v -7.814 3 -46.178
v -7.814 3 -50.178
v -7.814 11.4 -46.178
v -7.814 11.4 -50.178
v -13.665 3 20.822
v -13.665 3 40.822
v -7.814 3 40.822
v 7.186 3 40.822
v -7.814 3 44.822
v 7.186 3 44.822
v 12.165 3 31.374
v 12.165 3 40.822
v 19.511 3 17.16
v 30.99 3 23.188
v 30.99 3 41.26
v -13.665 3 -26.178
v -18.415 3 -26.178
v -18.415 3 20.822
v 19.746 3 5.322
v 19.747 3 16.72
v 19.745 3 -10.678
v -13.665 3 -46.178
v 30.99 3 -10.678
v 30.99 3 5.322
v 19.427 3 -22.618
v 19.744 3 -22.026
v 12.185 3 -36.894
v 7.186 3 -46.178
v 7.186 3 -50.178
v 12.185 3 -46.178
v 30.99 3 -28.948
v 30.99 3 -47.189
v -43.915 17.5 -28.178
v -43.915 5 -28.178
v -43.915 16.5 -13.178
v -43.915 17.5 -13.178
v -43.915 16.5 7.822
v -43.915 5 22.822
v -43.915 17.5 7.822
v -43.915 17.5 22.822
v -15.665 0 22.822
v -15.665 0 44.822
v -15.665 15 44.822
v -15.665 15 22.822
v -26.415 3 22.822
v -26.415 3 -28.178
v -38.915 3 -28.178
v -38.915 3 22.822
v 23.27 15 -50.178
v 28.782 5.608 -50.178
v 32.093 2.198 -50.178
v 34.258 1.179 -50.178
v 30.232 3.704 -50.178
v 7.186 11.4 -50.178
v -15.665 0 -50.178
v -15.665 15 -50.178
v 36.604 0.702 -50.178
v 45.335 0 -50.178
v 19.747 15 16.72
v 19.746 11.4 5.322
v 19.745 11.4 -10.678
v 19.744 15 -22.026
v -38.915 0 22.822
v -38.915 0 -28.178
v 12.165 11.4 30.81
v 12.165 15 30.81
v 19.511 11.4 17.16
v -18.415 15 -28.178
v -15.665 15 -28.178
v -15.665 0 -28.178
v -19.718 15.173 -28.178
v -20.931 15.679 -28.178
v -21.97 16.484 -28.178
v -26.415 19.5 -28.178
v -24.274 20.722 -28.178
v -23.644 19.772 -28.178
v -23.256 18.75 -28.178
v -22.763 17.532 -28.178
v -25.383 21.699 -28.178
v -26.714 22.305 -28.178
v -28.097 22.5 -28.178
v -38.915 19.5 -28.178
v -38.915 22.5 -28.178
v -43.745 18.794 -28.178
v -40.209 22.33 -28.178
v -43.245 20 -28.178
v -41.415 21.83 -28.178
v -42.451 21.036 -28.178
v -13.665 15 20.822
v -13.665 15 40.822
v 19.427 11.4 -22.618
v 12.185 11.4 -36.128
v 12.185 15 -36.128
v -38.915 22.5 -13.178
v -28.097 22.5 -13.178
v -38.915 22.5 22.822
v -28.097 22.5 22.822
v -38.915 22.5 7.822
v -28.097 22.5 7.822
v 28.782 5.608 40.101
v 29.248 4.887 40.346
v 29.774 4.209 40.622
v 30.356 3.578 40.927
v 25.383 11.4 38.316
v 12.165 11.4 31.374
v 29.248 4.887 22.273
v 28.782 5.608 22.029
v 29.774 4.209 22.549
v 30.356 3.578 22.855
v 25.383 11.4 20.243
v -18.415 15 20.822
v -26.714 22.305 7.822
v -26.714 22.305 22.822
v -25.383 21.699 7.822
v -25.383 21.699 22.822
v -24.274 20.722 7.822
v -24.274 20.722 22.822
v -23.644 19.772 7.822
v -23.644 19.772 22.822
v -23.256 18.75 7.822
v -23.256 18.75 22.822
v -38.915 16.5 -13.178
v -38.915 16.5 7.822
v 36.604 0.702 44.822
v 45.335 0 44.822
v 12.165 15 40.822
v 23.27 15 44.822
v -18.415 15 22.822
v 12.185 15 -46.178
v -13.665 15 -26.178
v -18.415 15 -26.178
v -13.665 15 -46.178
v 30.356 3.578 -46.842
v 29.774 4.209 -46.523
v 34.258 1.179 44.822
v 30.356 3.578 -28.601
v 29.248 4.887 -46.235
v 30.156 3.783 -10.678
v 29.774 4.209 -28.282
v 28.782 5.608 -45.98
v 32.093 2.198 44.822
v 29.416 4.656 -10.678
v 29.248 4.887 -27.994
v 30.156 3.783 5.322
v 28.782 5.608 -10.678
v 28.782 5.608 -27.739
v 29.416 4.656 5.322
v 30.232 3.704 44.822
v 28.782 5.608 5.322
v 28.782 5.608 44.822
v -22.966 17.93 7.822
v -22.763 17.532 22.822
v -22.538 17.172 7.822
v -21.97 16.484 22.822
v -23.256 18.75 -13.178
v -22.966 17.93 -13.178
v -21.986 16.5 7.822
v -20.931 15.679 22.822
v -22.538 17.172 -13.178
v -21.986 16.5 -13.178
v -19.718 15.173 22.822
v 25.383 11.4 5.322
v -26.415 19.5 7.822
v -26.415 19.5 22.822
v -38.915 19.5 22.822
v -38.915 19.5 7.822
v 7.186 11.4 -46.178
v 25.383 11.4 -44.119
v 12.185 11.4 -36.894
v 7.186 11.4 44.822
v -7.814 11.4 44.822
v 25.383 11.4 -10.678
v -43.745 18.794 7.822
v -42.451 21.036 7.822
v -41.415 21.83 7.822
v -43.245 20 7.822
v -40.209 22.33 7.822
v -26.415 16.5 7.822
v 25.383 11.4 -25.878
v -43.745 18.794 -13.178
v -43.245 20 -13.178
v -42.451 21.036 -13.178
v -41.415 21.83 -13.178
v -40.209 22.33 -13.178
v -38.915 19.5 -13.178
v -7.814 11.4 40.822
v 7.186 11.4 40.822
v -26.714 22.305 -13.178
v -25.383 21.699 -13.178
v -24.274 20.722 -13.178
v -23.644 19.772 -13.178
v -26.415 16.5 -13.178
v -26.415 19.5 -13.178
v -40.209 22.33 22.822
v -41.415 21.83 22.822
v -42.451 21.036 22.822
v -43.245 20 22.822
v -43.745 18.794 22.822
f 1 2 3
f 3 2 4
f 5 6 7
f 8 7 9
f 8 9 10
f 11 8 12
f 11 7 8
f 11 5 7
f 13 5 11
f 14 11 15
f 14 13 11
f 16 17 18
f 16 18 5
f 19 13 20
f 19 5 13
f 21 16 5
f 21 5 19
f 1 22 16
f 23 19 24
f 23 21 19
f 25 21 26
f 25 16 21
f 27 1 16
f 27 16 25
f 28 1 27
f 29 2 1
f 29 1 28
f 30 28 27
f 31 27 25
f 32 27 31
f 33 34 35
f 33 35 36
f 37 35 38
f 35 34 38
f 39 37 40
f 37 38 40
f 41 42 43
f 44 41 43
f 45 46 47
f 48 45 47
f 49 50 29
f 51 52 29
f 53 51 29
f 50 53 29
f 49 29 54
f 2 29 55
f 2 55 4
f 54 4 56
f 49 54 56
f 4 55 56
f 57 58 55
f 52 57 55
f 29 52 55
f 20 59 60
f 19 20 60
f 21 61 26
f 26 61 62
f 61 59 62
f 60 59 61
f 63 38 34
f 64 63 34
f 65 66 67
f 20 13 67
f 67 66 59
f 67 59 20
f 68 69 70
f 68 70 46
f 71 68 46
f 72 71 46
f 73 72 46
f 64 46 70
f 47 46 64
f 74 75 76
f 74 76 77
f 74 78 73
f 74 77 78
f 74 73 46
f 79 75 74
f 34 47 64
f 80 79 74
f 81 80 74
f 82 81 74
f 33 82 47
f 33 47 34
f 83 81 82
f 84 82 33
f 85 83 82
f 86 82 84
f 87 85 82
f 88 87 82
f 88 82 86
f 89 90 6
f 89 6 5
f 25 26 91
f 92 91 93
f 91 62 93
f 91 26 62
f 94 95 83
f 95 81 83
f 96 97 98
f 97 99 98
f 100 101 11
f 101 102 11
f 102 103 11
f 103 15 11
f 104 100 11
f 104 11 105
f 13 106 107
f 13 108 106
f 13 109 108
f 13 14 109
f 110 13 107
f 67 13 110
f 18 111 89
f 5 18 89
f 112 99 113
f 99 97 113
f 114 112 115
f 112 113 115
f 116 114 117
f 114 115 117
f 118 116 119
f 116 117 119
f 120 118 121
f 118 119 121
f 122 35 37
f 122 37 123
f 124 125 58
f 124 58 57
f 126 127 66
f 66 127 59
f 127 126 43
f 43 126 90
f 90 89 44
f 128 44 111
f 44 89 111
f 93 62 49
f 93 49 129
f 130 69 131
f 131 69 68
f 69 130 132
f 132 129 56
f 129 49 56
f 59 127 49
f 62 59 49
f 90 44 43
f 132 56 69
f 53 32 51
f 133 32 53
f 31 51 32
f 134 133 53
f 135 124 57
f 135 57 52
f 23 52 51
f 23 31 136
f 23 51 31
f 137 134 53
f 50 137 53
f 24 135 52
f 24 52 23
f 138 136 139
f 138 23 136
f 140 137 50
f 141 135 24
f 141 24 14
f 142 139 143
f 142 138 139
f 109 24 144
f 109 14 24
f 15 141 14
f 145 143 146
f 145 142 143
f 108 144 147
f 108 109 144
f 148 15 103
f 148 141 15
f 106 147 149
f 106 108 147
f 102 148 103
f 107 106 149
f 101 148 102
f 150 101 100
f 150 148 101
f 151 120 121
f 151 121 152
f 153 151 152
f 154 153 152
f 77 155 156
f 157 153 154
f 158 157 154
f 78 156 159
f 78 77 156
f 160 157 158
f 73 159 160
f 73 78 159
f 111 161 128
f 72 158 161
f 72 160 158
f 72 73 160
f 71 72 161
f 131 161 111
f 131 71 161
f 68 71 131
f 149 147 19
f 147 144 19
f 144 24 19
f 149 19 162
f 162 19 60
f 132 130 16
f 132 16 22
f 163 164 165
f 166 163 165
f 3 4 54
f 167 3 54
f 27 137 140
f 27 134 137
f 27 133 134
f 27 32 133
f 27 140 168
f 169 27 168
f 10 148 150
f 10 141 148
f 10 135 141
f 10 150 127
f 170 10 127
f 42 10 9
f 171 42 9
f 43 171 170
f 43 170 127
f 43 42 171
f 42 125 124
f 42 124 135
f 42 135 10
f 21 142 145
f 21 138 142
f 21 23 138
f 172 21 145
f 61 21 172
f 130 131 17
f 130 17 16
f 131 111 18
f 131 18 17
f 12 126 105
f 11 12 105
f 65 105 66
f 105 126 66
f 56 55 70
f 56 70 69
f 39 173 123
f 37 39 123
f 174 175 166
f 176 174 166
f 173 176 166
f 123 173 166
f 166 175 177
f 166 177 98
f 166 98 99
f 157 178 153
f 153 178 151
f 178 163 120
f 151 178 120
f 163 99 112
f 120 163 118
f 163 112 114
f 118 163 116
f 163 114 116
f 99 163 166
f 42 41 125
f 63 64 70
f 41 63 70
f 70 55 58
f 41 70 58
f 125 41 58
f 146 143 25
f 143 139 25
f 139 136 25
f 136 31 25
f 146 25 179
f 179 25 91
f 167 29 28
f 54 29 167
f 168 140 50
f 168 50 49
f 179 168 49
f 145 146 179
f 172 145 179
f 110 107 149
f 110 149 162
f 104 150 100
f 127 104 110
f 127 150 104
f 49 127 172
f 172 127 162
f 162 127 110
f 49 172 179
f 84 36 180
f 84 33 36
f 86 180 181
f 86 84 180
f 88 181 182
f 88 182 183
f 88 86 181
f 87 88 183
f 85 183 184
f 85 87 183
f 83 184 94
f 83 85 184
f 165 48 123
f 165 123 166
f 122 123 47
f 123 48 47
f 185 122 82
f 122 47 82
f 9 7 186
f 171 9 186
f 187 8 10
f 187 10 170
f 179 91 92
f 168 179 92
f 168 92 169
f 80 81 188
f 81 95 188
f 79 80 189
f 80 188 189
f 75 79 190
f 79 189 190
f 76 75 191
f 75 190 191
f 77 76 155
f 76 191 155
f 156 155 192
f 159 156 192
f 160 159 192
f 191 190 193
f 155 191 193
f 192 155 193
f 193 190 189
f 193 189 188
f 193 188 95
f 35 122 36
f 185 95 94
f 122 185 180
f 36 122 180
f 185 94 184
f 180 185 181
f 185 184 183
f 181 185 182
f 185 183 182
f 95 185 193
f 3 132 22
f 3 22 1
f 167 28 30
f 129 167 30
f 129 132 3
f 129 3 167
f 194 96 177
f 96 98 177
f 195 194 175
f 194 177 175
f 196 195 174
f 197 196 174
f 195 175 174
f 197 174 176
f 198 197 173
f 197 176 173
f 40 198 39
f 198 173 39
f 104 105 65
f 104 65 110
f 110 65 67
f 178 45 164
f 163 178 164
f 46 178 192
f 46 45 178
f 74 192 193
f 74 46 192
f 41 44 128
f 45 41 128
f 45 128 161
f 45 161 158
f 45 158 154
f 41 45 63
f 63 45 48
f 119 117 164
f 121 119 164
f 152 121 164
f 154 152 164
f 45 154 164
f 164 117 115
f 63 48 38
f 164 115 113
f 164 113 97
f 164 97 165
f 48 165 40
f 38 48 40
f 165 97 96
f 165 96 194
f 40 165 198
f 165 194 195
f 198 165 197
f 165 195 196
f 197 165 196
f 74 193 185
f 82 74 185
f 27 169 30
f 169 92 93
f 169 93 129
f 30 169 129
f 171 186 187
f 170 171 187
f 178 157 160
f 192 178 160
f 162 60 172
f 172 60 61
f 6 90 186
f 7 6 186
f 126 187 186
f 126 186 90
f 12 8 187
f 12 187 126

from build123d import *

# Parameters (mm, degrees)
SKETCH1_W                = 95
SKETCH1_H                = 95
BOSS_EXTRUDE1_DEPTH      = 20
SKETCH2_W                = 15
SKETCH2_H                = 8.4
CUT_EXTRUDE1_DEPTH       = 50
CUT_EXTRUDE3_DEPTH       = 100
FILLET1_R                = 10
CUT_EXTRUDE4_DEPTH       = 17
SKETCH8_W                = 15
SKETCH8_H                = 8.4
CUT_EXTRUDE5_DEPTH       = 4
SKETCH9_W                = 15
SKETCH9_H                = 8.4
CUT_EXTRUDE6_DEPTH       = 4
SKETCH10_W               = 15
SKETCH10_H               = 8.4
CUT_EXTRUDE7_DEPTH       = 100
SKETCH11_W               = 15
SKETCH11_H               = 8.4
CUT_EXTRUDE8_DEPTH       = 100
SKETCH12_W               = 96.22761595
SKETCH12_H               = 5
CUT_EXTRUDE9_DEPTH       = 100
SKETCH14_W               = 16
SKETCH14_H               = 8.4
CUT_EXTRUDE10_DEPTH      = 100
SKETCH15_W               = 16
SKETCH15_H               = 8.4
CUT_EXTRUDE11_DEPTH      = 100
SKETCH16_W               = 16
SKETCH16_H               = 8.4
CUT_EXTRUDE13_DEPTH      = 100
CUT_EXTRUDE16_DEPTH      = 12
SKETCH21_W               = 23.779532914
SKETCH21_H               = 2
BOSS_EXTRUDE2_DEPTH      = 12
SKETCH23_W               = 23.759878039
SKETCH23_H               = 2
BOSS_EXTRUDE3_DEPTH      = 12
CUT_EXTRUDE19_DEPTH      = 100
CUT_EXTRUDE19_DEPTH_BACK = 100
SKETCH24_W               = 15
SKETCH24_H               = 8.4
SKETCH26_W               = 20
SKETCH26_H               = 95
BOSS_EXTRUDE4_DEPTH      = 20
SKETCH31_W               = 95
SKETCH31_H               = 20
BOSS_EXTRUDE6_DEPTH      = 10
SKETCH32_W               = 12.5
SKETCH32_H               = 16.5
CUT_EXTRUDE22_DEPTH      = 100
SKETCH33_W               = 3.75
SKETCH33_H               = 20
CUT_EXTRUDE23_DEPTH      = 100
SKETCH34_W               = 26.25
SKETCH34_H               = 12.5
CUT_EXTRUDE24_DEPTH      = 100
SKETCH35_W               = 34
SKETCH35_H               = 47.07285681
CUT_EXTRUDE25_DEPTH      = 22
SKETCH36_W               = 34
SKETCH36_H               = 30.604426896
CUT_EXTRUDE26_DEPTH      = 22
SKETCH37_W               = 26.25
SKETCH37_H               = 21
CUT_EXTRUDE28_DEPTH      = 6
SKETCH38_W               = 5.75
SKETCH38_H               = 22.5
CUT_EXTRUDE29_DEPTH      = 100
CHAMFER1_SIZE            = 5
SKETCH39_W               = 2.070576792
SKETCH39_H               = 87
CUT_EXTRUDE30_DEPTH      = 12
FILLET4_R                = 5
FILLET5_R                = 5
SKETCH40_W               = 4.75
SKETCH40_H               = 47
CUT_EXTRUDE31_DEPTH      = 12
FILLET6_R                = 5


with BuildPart() as part:
    # Sketch1 → Boss-Extrude1 (new body)
    with BuildSketch(Plane(origin=(0, 0, 0), x_dir=(1, 0, 0), z_dir=(0, 1, 0))):
        with Locations((-2.165031067, 2.677660124)):
            Rectangle(SKETCH1_W, SKETCH1_H)
    extrude(amount=BOSS_EXTRUDE1_DEPTH)

    # Sketch2 → Cut-Extrude1 (cut)
    with BuildSketch(Plane(origin=(45.334968933, 0, 0), x_dir=(0, 0, -1), z_dir=(1, 0, 0))):
        with Locations((2.677660124, 7.2)):
            Rectangle(SKETCH2_W, SKETCH2_H)
    extrude(amount=-CUT_EXTRUDE1_DEPTH, mode=Mode.SUBTRACT)

    # Sketch6 → Cut-Extrude3 (cut)
    with BuildSketch(Plane.XY.offset(44.822339876)):
        Polygon((45.334968933, 0), (31.416327077, 1.119733542), (20.334968933, 20), (45.334968933, 20), align=None)
    extrude(amount=-CUT_EXTRUDE3_DEPTH, mode=Mode.SUBTRACT)

    # Fillet1
    # the kernel refuses this fillet: 10 mm, written as the material it adds along each edge
    with BuildSketch(Plane(origin=(31.416327077, 1.119733542, 44.822339876), x_dir=(0.9967796443594351, -0.08018940447888392, 0), z_dir=(0, 0, -1))) as fillet1_piece_1_section:
        with BuildLine():
            CenterArc((FILLET1_R * 0.52046366993, -FILLET1_R), FILLET1_R, 90, 54.990678882)
            Line((-FILLET1_R * 0.298595051697, -FILLET1_R * 0.426290308146), (0, 0))
            Line((0, 0), (FILLET1_R * 0.52046366993, 0))
        make_face()
    fillet1_piece_1 = extrude(amount=95, mode=Mode.PRIVATE)
    fillet1_piece_1 = split(fillet1_piece_1, bisect_by=Plane(origin=(32.462514907, 1.548685907, 4.822339876), z_dir=(0, 0, 1)), keep=Keep.TOP, mode=Mode.PRIVATE)
    fillet1_piece_1 = split(fillet1_piece_1, bisect_by=Plane(origin=(32.462514907, 3, 24.822339876), z_dir=(0, -1, 0)), keep=Keep.TOP, mode=Mode.PRIVATE)
    add(fillet1_piece_1)
    with BuildSketch(Plane(origin=(31.416327077, 1.119733542, 44.822339876), x_dir=(0.9967796443594351, -0.08018940447888392, 0), z_dir=(0, 0, -1))) as fillet1_piece_2_section:
        with BuildLine():
            CenterArc((FILLET1_R * 0.52046366993, -FILLET1_R), FILLET1_R, 90, 54.990678882)
            Line((-FILLET1_R * 0.298595051697, -FILLET1_R * 0.426290308146), (0, 0))
            Line((0, 0), (FILLET1_R * 0.52046366993, 0))
        make_face()
    fillet1_piece_2 = extrude(amount=95, mode=Mode.PRIVATE)
    fillet1_piece_2 = split(fillet1_piece_2, bisect_by=Plane(origin=(29.780943428, 3.965739863, 4.822339876), z_dir=(0, 0, 1)), keep=Keep.TOP, mode=Mode.PRIVATE)
    fillet1_piece_2 = split(fillet1_piece_2, bisect_by=Plane(origin=(29.780943428, 3, 24.822339876), z_dir=(0, 1, 0)), keep=Keep.TOP, mode=Mode.PRIVATE)
    add(fillet1_piece_2)
    with BuildSketch(Plane(origin=(31.416327077, 1.119733542, 44.822339876), x_dir=(0.9967796443594351, -0.08018940447888392, 0), z_dir=(0, 0, -1))) as fillet1_piece_3_section:
        with BuildLine():
            CenterArc((FILLET1_R * 0.52046366993, -FILLET1_R), FILLET1_R, 90, 54.990678882)
            Line((-FILLET1_R * 0.298595051697, -FILLET1_R * 0.426290308146), (0, 0))
            Line((0, 0), (FILLET1_R * 0.52046366993, 0))
        make_face()
    fillet1_piece_3 = extrude(amount=95, mode=Mode.PRIVATE)
    fillet1_piece_3 = split(fillet1_piece_3, bisect_by=Plane(origin=(32.462514907, 1.548685907, -10.177660124), z_dir=(0, 0, 1)), keep=Keep.TOP, mode=Mode.PRIVATE)
    fillet1_piece_3 = split(fillet1_piece_3, bisect_by=Plane(origin=(32.462514907, 1.548685907, 4.822339876), z_dir=(0, 0, -1)), keep=Keep.TOP, mode=Mode.PRIVATE)
    fillet1_piece_3 = split(fillet1_piece_3, bisect_by=Plane(origin=(32.462514907, 3, -2.677660124), z_dir=(0, -1, 0)), keep=Keep.TOP, mode=Mode.PRIVATE)
    add(fillet1_piece_3)
    with BuildSketch(Plane(origin=(31.416327077, 1.119733542, 44.822339876), x_dir=(0.9967796443594351, -0.08018940447888392, 0), z_dir=(0, 0, -1))) as fillet1_piece_4_section:
        with BuildLine():
            CenterArc((FILLET1_R * 0.52046366993, -FILLET1_R), FILLET1_R, 90, 54.990678882)
            Line((-FILLET1_R * 0.298595051697, -FILLET1_R * 0.426290308146), (0, 0))
            Line((0, 0), (FILLET1_R * 0.52046366993, 0))
        make_face()
    fillet1_piece_4 = extrude(amount=95, mode=Mode.PRIVATE)
    fillet1_piece_4 = split(fillet1_piece_4, bisect_by=Plane(origin=(32.462514907, 1.548685907, -10.177660124), z_dir=(0, 0, -1)), keep=Keep.TOP, mode=Mode.PRIVATE)
    fillet1_piece_4 = split(fillet1_piece_4, bisect_by=Plane(origin=(32.462514907, 3, -30.177660124), z_dir=(0, -1, 0)), keep=Keep.TOP, mode=Mode.PRIVATE)
    add(fillet1_piece_4)
    with BuildSketch(Plane(origin=(31.416327077, 1.119733542, 44.822339876), x_dir=(0.9967796443594351, -0.08018940447888392, 0), z_dir=(0, 0, -1))) as fillet1_piece_5_section:
        with BuildLine():
            CenterArc((FILLET1_R * 0.52046366993, -FILLET1_R), FILLET1_R, 90, 54.990678882)
            Line((-FILLET1_R * 0.298595051697, -FILLET1_R * 0.426290308146), (0, 0))
            Line((0, 0), (FILLET1_R * 0.52046366993, 0))
        make_face()
    fillet1_piece_5 = extrude(amount=95, mode=Mode.PRIVATE)
    fillet1_piece_5 = split(fillet1_piece_5, bisect_by=Plane(origin=(29.780943428, 3.965739863, -10.177660124), z_dir=(0, 0, -1)), keep=Keep.TOP, mode=Mode.PRIVATE)
    fillet1_piece_5 = split(fillet1_piece_5, bisect_by=Plane(origin=(29.780943428, 3, -30.177660124), z_dir=(0, 1, 0)), keep=Keep.TOP, mode=Mode.PRIVATE)
    add(fillet1_piece_5)

    # Sketch7 → Cut-Extrude4 (cut)
    with BuildSketch(Plane(origin=(0, 20, 0), x_dir=(1, 0, 0), z_dir=(0, 1, 0))):
        Polygon((11.360713437, -29.822339876), (18.334968933, -16.542288661), (9.481601456, -11.892784997), (2.50734596, -25.172836212), align=None)
        Polygon((18.334968933, 22.020257336), (11.132000664, 35.177660124), (2.360398805, 30.375681278), (9.563367074, 17.21827849), align=None)
    extrude(amount=-CUT_EXTRUDE4_DEPTH, mode=Mode.SUBTRACT)

    # Sketch8 → Cut-Extrude5 (cut)
    with BuildSketch(Plane(origin=(12.327397833, 0, 6.473952599), x_dir=(0.4649503663833249, 0, -0.885336747684186), z_dir=(0.8853367476841859, 0, 0.4649503663833248))):
        with Locations((-13.620645519, 7.2)):
            Rectangle(SKETCH8_W, SKETCH8_H)
    extrude(amount=-CUT_EXTRUDE5_DEPTH, mode=Mode.SUBTRACT)

    # Sketch9 → Cut-Extrude6 (cut)
    with BuildSketch(Plane(origin=(14.610669282, 0, -7.99855328), x_dir=(-0.48019788460400603, 0, -0.8771601858394155), z_dir=(0.8771601858394155, 0, -0.48019788460400603))):
        with Locations((18.010879722, 7.2)):
            Rectangle(SKETCH9_W, SKETCH9_H)
    extrude(amount=-CUT_EXTRUDE6_DEPTH, mode=Mode.SUBTRACT)

    # Sketch10 → Cut-Extrude7 (cut)
    with BuildSketch(Plane(origin=(8.786050842, 0, 4.614151134), x_dir=(0.464950366383325, 0, -0.8853367476841859), z_dir=(0.8853367476841859, 0, 0.464950366383325))):
        with Locations((-13.620645519, 7.2)):
            Rectangle(SKETCH10_W, SKETCH10_H)
    extrude(amount=CUT_EXTRUDE7_DEPTH, mode=Mode.SUBTRACT)

    # Sketch11 → Cut-Extrude8 (cut)
    with BuildSketch(Plane(origin=(11.102028539, 0, -6.077761742), x_dir=(-0.48019788460400603, 0, -0.8771601858394155), z_dir=(0.8771601858394155, 0, -0.48019788460400603))):
        with Locations((18.010879722, 7.2)):
            Rectangle(SKETCH11_W, SKETCH11_H)
    extrude(amount=CUT_EXTRUDE8_DEPTH, mode=Mode.SUBTRACT)

    # Sketch12 → Cut-Extrude9 (cut)
    with BuildSketch(Plane.XY.offset(44.822339876)):
        with Locations((-1.551223092, 17.5)):
            Rectangle(SKETCH12_W, SKETCH12_H)
    extrude(amount=-CUT_EXTRUDE9_DEPTH, mode=Mode.SUBTRACT)

    # Sketch14 → Cut-Extrude10 (cut)
    with BuildSketch(Plane(origin=(11.102028539, 0, -6.077761742), x_dir=(-0.48019788460400603, 0, -0.8771601858394155), z_dir=(0.8771601858394155, 0, -0.48019788460400603))):
        with Locations((18.510879722, 7.2)):
            Rectangle(SKETCH14_W, SKETCH14_H)
    extrude(amount=CUT_EXTRUDE10_DEPTH, mode=Mode.SUBTRACT)

    # Sketch15 → Cut-Extrude11 (cut)
    with BuildSketch(Plane(origin=(8.786050842, 0, 4.614151134), x_dir=(0.464950366383325, 0, -0.8853367476841859), z_dir=(0.8853367476841859, 0, 0.464950366383325))):
        with Locations((-14.120645519, 7.2)):
            Rectangle(SKETCH15_W, SKETCH15_H)
    extrude(amount=CUT_EXTRUDE11_DEPTH, mode=Mode.SUBTRACT)

    # Sketch16 → Cut-Extrude13 (cut)
    with BuildSketch(Plane(origin=(-4.665031067, 0, 0), x_dir=(0, 0, -1), z_dir=(1, 0, 0))):
        with Locations((2.677660124, 7.2)):
            Rectangle(SKETCH16_W, SKETCH16_H)
    extrude(amount=CUT_EXTRUDE13_DEPTH, mode=Mode.SUBTRACT)

    # Sketch19 → Cut-Extrude16 (cut)
    with BuildSketch(Plane(origin=(0, 15, 0), x_dir=(1, 0, 0), z_dir=(0, 1, 0))):
        Polygon((12.165423764, -30.809704699), (19.747212292, -16.720116958), (19.744163962, 22.025988312), (12.185078639, 36.127769372), (12.185078639, 48.177660124), (-11.594454275, 48.177660124), (-11.594454275, -42.822339876), (12.165423764, -42.822339876), align=None)
    extrude(amount=-CUT_EXTRUDE16_DEPTH, mode=Mode.SUBTRACT)

    # Sketch21 → Boss-Extrude2 (add)
    with BuildSketch(Plane(origin=(0, 3, 0), x_dir=(1, 0, 0), z_dir=(0, 1, 0))):
        with Locations((0.295312182, 47.177660124)):
            Rectangle(SKETCH21_W, SKETCH21_H)
    extrude(amount=BOSS_EXTRUDE2_DEPTH)

    # Sketch23 → Boss-Extrude3 (add)
    with BuildSketch(Plane(origin=(0, 3, 0), x_dir=(1, 0, 0), z_dir=(0, 1, 0))):
        with Locations((0.285484745, -41.822339876)):
            Rectangle(SKETCH23_W, SKETCH23_H)
    extrude(amount=BOSS_EXTRUDE3_DEPTH)

    # Sketch24 → Cut-Extrude19 (cut, two sides: drawn at the far end of the back side and taken through both)
    with BuildSketch(Plane.XY.offset(-46.177660124).offset(-CUT_EXTRUDE19_DEPTH_BACK)):
        with Locations((-0.314454275, 7.2)):
            Rectangle(SKETCH24_W, SKETCH24_H)
    extrude(amount=CUT_EXTRUDE19_DEPTH + CUT_EXTRUDE19_DEPTH_BACK, mode=Mode.SUBTRACT)

    # Sketch26 → Boss-Extrude4 (add)
    with BuildSketch(Plane(origin=(0, 15, 0), x_dir=(1, 0, 0), z_dir=(0, 1, 0))):
        with Locations((-39.665031067, 2.677660124)):
            Rectangle(SKETCH26_W, SKETCH26_H)
    extrude(amount=BOSS_EXTRUDE4_DEPTH)

    # Sketch31 → Boss-Extrude6 (add)
    with BuildSketch(Plane(origin=(-29.665031067, 0, 0), x_dir=(0, 0, -1), z_dir=(1, 0, 0))):
        with Locations((2.677660124, 25)):
            Rectangle(SKETCH31_W, SKETCH31_H)
    extrude(amount=BOSS_EXTRUDE6_DEPTH)

    # Sketch32 → Cut-Extrude22 (cut)
    with BuildSketch(Plane(origin=(0, 0, -50.177660124), x_dir=(-1, 0, 0), z_dir=(0, 0, -1))):
        with Locations((32.665031067, 11.25)):
            Rectangle(SKETCH32_W, SKETCH32_H)
    extrude(amount=-CUT_EXTRUDE22_DEPTH, mode=Mode.SUBTRACT)

    # Sketch33 → Cut-Extrude23 (cut)
    with BuildSketch(Plane(origin=(0, 0, -50.177660124), x_dir=(-1, 0, 0), z_dir=(0, 0, -1))):
        with Locations((21.540031067, 25)):
            Rectangle(SKETCH33_W, SKETCH33_H)
    extrude(amount=-CUT_EXTRUDE23_DEPTH, mode=Mode.SUBTRACT)

    # Sketch34 → Cut-Extrude24 (cut)
    with BuildSketch(Plane(origin=(0, 0, -50.177660124), x_dir=(-1, 0, 0), z_dir=(0, 0, -1))):
        with Locations((36.540031067, 28.75)):
            Rectangle(SKETCH34_W, SKETCH34_H)
    extrude(amount=-CUT_EXTRUDE24_DEPTH, mode=Mode.SUBTRACT)

    # Sketch35 → Cut-Extrude25 (cut)
    with BuildSketch(Plane(origin=(0, 0, -50.177660124), x_dir=(-1, 0, 0), z_dir=(0, 0, -1))):
        with Locations((32.665031067, 23.536428405)):
            Rectangle(SKETCH35_W, SKETCH35_H)
    extrude(amount=-CUT_EXTRUDE25_DEPTH, mode=Mode.SUBTRACT)

    # Sketch36 → Cut-Extrude26 (cut)
    with BuildSketch(Plane.XY.offset(44.822339876)):
        with Locations((-32.665031067, 15.302213448)):
            Rectangle(SKETCH36_W, SKETCH36_H)
    extrude(amount=-CUT_EXTRUDE26_DEPTH, mode=Mode.SUBTRACT)

    # Sketch37 → Cut-Extrude28 (cut)
    with BuildSketch(Plane(origin=(0, 22.5, 0), x_dir=(1, 0, 0), z_dir=(0, 1, 0))):
        with Locations((-36.540031067, 2.677660124)):
            Rectangle(SKETCH37_W, SKETCH37_H)
    extrude(amount=-CUT_EXTRUDE28_DEPTH, mode=Mode.SUBTRACT)

    # Sketch38 → Cut-Extrude29 (cut)
    with BuildSketch(Plane.XY.offset(22.822339876)):
        with Locations((-46.790031067, 11.25)):
            Rectangle(SKETCH38_W, SKETCH38_H)
    extrude(amount=-CUT_EXTRUDE29_DEPTH, mode=Mode.SUBTRACT)

    # Chamfer1
    chamfer1_edges = [part.edges().sort_by_distance(p)[0] for p in [
        (-43.915031067, 0, -2.677660124),
    ]]
    chamfer(chamfer1_edges, length=CHAMFER1_SIZE)

    # Sketch39 → Cut-Extrude30 (cut)
    with BuildSketch(Plane(origin=(0, 15, 0), x_dir=(1, 0, 0), z_dir=(0, 1, 0))):
        with Locations((-12.629742671, 2.677660124)):
            Rectangle(SKETCH39_W, SKETCH39_H)
    extrude(amount=-CUT_EXTRUDE30_DEPTH, mode=Mode.SUBTRACT)

    # Fillet4
    # the kernel refuses this fillet: 5 mm, written as the material it adds along each edge
    with BuildSketch(Plane(origin=(-23.415031067, 15, -28.177660124), x_dir=(1, 0, 0), z_dir=(0, 0, 1))) as fillet4_piece_1_section:
        with BuildLine():
            CenterArc((FILLET4_R, FILLET4_R), FILLET4_R, 180, 90)
            Line((0, FILLET4_R), (0, 0))
            Line((0, 0), (FILLET4_R, 0))
        make_face()
    fillet4_piece_1 = extrude(amount=51, mode=Mode.PRIVATE)
    fillet4_piece_1 = split(fillet4_piece_1, bisect_by=Plane(origin=(-21.940460429, 15.541584114, -13.177660124), z_dir=(0, 0, -1)), keep=Keep.TOP, mode=Mode.PRIVATE)
    fillet4_piece_1 = split(fillet4_piece_1, bisect_by=Plane(origin=(-21.940460429, 16.5, -20.677660124), z_dir=(0, -1, 0)), keep=Keep.TOP, mode=Mode.PRIVATE)
    add(fillet4_piece_1)
    with BuildSketch(Plane(origin=(-23.415031067, 15, -28.177660124), x_dir=(1, 0, 0), z_dir=(0, 0, 1))) as fillet4_piece_2_section:
        with BuildLine():
            CenterArc((FILLET4_R, FILLET4_R), FILLET4_R, 180, 90)
            Line((0, FILLET4_R), (0, 0))
            Line((0, 0), (FILLET4_R, 0))
        make_face()
    fillet4_piece_2 = extrude(amount=51, mode=Mode.PRIVATE)
    fillet4_piece_2 = split(fillet4_piece_2, bisect_by=Plane(origin=(-23.084676974, 17.513403735, -13.177660124), z_dir=(0, 0, -1)), keep=Keep.TOP, mode=Mode.PRIVATE)
    fillet4_piece_2 = split(fillet4_piece_2, bisect_by=Plane(origin=(-23.084676974, 16.5, -20.677660124), z_dir=(0, 1, 0)), keep=Keep.TOP, mode=Mode.PRIVATE)
    add(fillet4_piece_2)
    with BuildSketch(Plane(origin=(-23.415031067, 15, -28.177660124), x_dir=(1, 0, 0), z_dir=(0, 0, 1))) as fillet4_piece_3_section:
        with BuildLine():
            CenterArc((FILLET4_R, FILLET4_R), FILLET4_R, 180, 90)
            Line((0, FILLET4_R), (0, 0))
            Line((0, 0), (FILLET4_R, 0))
        make_face()
    fillet4_piece_3 = extrude(amount=51, mode=Mode.PRIVATE)
    fillet4_piece_3 = split(fillet4_piece_3, bisect_by=Plane(origin=(-21.940460429, 15.541584114, -13.177660124), z_dir=(0, 0, 1)), keep=Keep.TOP, mode=Mode.PRIVATE)
    fillet4_piece_3 = split(fillet4_piece_3, bisect_by=Plane(origin=(-21.940460429, 16.5, -2.677660124), z_dir=(0, -1, 0)), keep=Keep.TOP, mode=Mode.PRIVATE)
    fillet4_piece_3 = split(fillet4_piece_3, bisect_by=Plane(origin=(-21.940460429, 15.541584114, 7.822339876), z_dir=(0, 0, -1)), keep=Keep.TOP, mode=Mode.PRIVATE)
    add(fillet4_piece_3)
    with BuildSketch(Plane(origin=(-23.415031067, 15, -28.177660124), x_dir=(1, 0, 0), z_dir=(0, 0, 1))) as fillet4_piece_4_section:
        with BuildLine():
            CenterArc((FILLET4_R, FILLET4_R), FILLET4_R, 180, 90)
            Line((0, FILLET4_R), (0, 0))
            Line((0, 0), (FILLET4_R, 0))
        make_face()
    fillet4_piece_4 = extrude(amount=51, mode=Mode.PRIVATE)
    fillet4_piece_4 = split(fillet4_piece_4, bisect_by=Plane(origin=(-21.940460429, 16.5, 15.322339876), z_dir=(0, -1, 0)), keep=Keep.TOP, mode=Mode.PRIVATE)
    fillet4_piece_4 = split(fillet4_piece_4, bisect_by=Plane(origin=(-21.940460429, 15.541584114, 7.822339876), z_dir=(0, 0, 1)), keep=Keep.TOP, mode=Mode.PRIVATE)
    add(fillet4_piece_4)
    with BuildSketch(Plane(origin=(-23.415031067, 15, -28.177660124), x_dir=(1, 0, 0), z_dir=(0, 0, 1))) as fillet4_piece_5_section:
        with BuildLine():
            CenterArc((FILLET4_R, FILLET4_R), FILLET4_R, 180, 90)
            Line((0, FILLET4_R), (0, 0))
            Line((0, 0), (FILLET4_R, 0))
        make_face()
    fillet4_piece_5 = extrude(amount=51, mode=Mode.PRIVATE)
    fillet4_piece_5 = split(fillet4_piece_5, bisect_by=Plane(origin=(-23.084676974, 16.5, 15.322339876), z_dir=(0, 1, 0)), keep=Keep.TOP, mode=Mode.PRIVATE)
    fillet4_piece_5 = split(fillet4_piece_5, bisect_by=Plane(origin=(-23.084676974, 17.513403735, 7.822339876), z_dir=(0, 0, 1)), keep=Keep.TOP, mode=Mode.PRIVATE)
    add(fillet4_piece_5)

    # Fillet5
    fillet5_edges = [part.edges().sort_by_distance(p)[0] for p in [
        (-23.415031067, 22.5, 15.322339876),
        (-23.415031067, 22.5, -20.677660124),
    ]]
    fillet(fillet5_edges, radius=FILLET5_R)

    # Sketch40 → Cut-Extrude31 (cut)
    with BuildSketch(Plane(origin=(0, 15, 0), x_dir=(1, 0, 0), z_dir=(0, 1, 0))):
        with Locations((-16.040031067, 2.677660124)):
            Rectangle(SKETCH40_W, SKETCH40_H)
    extrude(amount=-CUT_EXTRUDE31_DEPTH, mode=Mode.SUBTRACT)

    # Fillet6
    fillet6_edges = [part.edges().sort_by_distance(p)[0] for p in [
        (-43.915031067, 22.5, -20.677660124),
        (-43.915031067, 22.5, 15.322339876),
    ]]
    fillet(fillet6_edges, radius=FILLET6_R)


solid = part.part
